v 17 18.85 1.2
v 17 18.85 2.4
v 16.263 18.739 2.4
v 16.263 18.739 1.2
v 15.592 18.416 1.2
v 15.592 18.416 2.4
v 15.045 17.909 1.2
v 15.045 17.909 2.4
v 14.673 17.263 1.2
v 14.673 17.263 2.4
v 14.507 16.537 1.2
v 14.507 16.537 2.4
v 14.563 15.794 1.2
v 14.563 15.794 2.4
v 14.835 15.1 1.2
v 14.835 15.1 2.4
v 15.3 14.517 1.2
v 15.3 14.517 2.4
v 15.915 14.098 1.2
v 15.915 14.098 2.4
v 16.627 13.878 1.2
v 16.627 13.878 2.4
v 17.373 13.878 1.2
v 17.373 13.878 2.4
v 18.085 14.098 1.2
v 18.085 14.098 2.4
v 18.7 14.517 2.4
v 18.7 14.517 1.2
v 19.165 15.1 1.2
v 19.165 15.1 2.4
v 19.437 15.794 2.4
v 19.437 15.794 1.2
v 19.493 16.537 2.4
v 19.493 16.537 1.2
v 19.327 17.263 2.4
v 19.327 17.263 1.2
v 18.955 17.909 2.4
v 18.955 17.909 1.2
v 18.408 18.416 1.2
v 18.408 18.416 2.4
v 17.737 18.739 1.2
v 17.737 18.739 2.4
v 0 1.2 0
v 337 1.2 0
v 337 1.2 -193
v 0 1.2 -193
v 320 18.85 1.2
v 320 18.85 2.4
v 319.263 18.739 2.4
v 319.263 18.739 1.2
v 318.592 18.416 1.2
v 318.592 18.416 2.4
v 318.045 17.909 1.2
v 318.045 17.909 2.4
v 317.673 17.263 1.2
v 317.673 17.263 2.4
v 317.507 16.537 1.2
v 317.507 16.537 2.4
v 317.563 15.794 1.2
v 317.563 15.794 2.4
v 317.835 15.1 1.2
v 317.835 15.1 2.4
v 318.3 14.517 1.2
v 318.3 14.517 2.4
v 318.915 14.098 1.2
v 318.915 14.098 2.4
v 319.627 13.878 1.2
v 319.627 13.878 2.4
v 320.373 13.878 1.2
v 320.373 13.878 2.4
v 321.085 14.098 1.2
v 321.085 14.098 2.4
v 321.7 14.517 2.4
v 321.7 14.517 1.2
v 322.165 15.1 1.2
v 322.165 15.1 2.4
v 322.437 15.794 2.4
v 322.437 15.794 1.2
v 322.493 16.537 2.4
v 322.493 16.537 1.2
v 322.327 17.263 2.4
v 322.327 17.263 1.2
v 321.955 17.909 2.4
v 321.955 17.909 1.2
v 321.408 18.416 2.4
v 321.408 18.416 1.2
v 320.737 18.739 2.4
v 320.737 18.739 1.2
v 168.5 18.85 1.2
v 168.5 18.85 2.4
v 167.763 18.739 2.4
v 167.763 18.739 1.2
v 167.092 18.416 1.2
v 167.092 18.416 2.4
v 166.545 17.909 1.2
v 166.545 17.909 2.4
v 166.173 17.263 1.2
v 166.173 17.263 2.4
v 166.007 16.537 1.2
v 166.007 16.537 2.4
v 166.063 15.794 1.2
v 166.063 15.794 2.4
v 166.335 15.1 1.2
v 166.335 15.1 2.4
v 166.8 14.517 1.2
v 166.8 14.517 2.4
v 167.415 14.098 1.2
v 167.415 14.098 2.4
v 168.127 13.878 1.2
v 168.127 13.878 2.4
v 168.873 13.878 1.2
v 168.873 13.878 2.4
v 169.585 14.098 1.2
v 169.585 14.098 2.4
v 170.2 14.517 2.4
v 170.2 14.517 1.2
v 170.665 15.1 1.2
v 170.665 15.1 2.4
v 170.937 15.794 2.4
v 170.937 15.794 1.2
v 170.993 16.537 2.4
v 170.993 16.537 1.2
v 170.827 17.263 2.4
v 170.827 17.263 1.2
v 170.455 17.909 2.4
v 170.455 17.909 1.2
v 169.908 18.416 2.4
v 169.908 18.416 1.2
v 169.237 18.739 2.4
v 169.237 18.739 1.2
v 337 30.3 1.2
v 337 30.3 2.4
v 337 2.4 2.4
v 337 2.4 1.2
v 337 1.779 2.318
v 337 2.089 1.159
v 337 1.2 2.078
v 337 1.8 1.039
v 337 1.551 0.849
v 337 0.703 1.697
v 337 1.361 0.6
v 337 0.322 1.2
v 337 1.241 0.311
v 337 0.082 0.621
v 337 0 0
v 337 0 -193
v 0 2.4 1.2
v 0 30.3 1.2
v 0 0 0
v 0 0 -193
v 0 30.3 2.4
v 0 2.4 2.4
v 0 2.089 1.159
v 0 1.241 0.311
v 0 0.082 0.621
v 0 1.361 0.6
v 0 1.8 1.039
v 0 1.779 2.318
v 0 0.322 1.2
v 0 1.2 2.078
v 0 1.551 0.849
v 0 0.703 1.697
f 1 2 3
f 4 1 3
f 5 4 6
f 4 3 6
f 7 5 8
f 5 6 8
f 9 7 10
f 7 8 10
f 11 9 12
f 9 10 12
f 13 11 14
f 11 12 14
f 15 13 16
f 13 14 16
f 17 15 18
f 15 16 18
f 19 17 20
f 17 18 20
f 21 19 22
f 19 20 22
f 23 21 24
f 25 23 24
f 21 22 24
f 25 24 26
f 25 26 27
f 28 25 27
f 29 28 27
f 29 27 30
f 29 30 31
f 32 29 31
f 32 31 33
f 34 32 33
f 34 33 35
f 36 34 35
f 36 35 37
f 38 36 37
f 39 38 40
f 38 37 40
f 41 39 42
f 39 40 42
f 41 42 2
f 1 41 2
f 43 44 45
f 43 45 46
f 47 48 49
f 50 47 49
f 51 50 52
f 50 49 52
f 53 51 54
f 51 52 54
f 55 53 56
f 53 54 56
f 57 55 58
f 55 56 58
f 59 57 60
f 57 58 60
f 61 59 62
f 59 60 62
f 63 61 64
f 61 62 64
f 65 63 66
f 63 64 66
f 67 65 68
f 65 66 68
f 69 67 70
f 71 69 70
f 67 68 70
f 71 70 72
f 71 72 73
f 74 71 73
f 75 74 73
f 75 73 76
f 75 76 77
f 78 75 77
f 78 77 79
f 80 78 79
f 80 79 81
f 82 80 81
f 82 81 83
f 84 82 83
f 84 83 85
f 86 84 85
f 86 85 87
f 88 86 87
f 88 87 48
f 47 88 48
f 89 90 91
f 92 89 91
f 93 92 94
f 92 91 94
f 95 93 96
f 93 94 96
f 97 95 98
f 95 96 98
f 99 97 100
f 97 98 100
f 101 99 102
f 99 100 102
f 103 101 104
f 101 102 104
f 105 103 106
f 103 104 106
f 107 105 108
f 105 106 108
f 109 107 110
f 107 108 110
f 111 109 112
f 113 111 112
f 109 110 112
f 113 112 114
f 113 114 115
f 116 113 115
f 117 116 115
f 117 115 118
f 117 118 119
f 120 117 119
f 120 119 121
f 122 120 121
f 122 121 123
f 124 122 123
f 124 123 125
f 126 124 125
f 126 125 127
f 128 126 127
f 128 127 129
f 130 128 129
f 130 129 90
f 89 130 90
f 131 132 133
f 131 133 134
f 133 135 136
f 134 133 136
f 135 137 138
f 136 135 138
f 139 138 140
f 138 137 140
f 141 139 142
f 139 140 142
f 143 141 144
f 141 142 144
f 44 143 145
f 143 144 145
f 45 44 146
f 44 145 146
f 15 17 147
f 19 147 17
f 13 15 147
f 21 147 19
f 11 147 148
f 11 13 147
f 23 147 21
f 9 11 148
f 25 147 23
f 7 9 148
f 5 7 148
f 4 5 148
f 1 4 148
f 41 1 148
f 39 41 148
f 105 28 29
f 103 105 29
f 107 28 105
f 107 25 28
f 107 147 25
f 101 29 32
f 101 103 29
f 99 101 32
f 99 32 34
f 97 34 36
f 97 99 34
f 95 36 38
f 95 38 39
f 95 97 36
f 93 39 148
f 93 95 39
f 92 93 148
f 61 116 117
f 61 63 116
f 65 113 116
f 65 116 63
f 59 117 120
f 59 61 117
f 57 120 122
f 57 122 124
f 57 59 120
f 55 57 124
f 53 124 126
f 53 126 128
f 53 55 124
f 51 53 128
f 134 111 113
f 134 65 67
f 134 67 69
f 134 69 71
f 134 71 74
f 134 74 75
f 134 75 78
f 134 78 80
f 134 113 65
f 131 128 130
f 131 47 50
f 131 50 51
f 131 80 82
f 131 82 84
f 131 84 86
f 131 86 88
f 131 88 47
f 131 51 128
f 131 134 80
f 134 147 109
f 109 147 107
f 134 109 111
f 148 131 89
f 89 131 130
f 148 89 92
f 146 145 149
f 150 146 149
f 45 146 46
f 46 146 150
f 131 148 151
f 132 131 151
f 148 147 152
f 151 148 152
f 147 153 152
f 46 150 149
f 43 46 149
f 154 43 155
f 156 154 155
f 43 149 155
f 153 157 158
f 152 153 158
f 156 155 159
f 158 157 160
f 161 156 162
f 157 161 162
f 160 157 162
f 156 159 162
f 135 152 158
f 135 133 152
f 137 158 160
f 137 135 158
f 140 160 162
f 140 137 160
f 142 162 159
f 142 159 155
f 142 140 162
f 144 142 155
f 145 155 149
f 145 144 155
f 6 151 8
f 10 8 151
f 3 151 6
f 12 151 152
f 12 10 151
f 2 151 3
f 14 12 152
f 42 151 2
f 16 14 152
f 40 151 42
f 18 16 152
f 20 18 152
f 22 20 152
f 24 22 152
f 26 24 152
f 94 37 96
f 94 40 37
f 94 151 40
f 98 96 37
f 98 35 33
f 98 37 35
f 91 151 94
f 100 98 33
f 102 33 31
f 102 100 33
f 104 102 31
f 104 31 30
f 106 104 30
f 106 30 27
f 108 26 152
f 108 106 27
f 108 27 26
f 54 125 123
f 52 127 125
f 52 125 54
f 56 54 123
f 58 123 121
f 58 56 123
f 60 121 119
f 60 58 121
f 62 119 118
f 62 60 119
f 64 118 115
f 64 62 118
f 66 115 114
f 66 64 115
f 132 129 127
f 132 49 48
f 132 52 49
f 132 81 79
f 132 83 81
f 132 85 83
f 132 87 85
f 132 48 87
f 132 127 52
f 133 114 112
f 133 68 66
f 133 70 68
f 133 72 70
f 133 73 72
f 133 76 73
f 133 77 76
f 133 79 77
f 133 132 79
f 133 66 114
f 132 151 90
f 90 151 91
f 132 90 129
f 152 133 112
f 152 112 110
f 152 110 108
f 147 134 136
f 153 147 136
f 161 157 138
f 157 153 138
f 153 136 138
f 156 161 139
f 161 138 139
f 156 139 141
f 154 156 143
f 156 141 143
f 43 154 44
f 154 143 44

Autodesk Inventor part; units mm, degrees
ref_plane "YZ Plane" through (0, 0, 0) normal (1, 0, 0) x (0, 1, 0)
ref_plane "XZ Plane" through (0, 0, 0) normal (0, 1, 0) x (-1, 0, 0)
ref_plane "XY Plane" through (0, 0, 0) normal (0, 0, 1) x (1, 0, 0)
sketch "Sketch2" plane through (0, 0, 0) normal (0, 1, 0) x (-1, 0, 0)
  line L0 (0, 0) -> (-337, 0)
  line L1 (-337, 0) -> (-337, -193)
  line L2 (-337, -193) -> (0, -193)
  line L3 (0, -193) -> (0, 0)
  dimension "d3" = 337
  dimension "d4" = 193
extrude "Plate1" add sketch "Sketch2" along normal blind 1.2
sketch "Sketch3" plane through (337, 2.4, 1.2) normal (0, 0, 1) x (1, 0, 0)
  line L0 (-337, 0) -> (0, 0)
  line L1 (0, 0) -> (0, 27.9)
  line L2 (0, 27.9) -> (-337, 27.9)
  line L3 (-337, 27.9) -> (-337, 0)
edge flange "Flange1" height 30.3 angle 90 thickness 1.2 bend radius 1.2 thickness toward (0, 0, 1) relief tear relief width 1.2 relief depth 0.6 edges at (168.5, 1.2, 0) wall of the first edge with corners at (0, 2.4, 1.2) (337, 2.4, 1.2) (337, 30.3, 1.2) (0, 30.3, 1.2)
bend "Bend1"
corner "Corner1"
sketch "Sketch4" plane through (337, 30.3, 1.2) normal (0, 0, -1) x (-1, 0, 0)
  line L0 (337, 0) -> (337, -27.9) projected
  line L1 (0, 0) -> (0, -27.9) projected
  line L2 (337, 0) -> (0, 0) projected
  point P0 (337, -30.3)
  point P1 (320, -13.95)
  point P2 (168.5, -13.95)
  point P3 (17, -13.95)
  dimension "d16" = 17
  dimension "d17" = 17
  dimension "d18" = 151.5
  dimension "d19" = 13.95
  dimension "d20" = 13.95
  dimension "d21" = 13.95
hole "Hole1" at (17, 16.35, 1.2) at (168.5, 16.35, 1.2) at (320, 16.35, 1.2) direction (0, 0, 1) diameter 5 depth 1.2 tip angle 118
equation "\"d17\" = d16"
equation "\"d20\" = d19"
equation "\"d21\" = d19"
equation "\"d27\" = Thickness"
equation "\"d5\" = Thickness"
equation "\"d6\" = BendReliefWidth"
equation "\"d7\" = BendReliefDepth"
equation "\"d8\" = MinimumRemnant"
equation "\"d9\" = TransitionRadius"
equation "\"d12\" = BendRadius"
equation "\"d13\" = CornerReliefSize"
equation "\"d14\" = GapSize"
equation "\"d15\" = JacobiRadiusSize"
equation "\"BendRadius\" = Thickness"
equation "\"BendReliefWidth\" = Thickness"
equation "\"BendReliefDepth\" = 0.5 * Thickness"
equation "\"CornerReliefSize\" = 4 * Thickness"
equation "\"MinimumRemnant\" = 2 * Thickness"
equation "\"TransitionRadius\" = BendRadius"
equation "\"JacobiRadiusSize\" = BendRadius"
equation "\"GapSize\" = Thickness"
equation "\"Thickness\" = 1.2"
properties part number "Separador" material "Steel ASTM A36"
